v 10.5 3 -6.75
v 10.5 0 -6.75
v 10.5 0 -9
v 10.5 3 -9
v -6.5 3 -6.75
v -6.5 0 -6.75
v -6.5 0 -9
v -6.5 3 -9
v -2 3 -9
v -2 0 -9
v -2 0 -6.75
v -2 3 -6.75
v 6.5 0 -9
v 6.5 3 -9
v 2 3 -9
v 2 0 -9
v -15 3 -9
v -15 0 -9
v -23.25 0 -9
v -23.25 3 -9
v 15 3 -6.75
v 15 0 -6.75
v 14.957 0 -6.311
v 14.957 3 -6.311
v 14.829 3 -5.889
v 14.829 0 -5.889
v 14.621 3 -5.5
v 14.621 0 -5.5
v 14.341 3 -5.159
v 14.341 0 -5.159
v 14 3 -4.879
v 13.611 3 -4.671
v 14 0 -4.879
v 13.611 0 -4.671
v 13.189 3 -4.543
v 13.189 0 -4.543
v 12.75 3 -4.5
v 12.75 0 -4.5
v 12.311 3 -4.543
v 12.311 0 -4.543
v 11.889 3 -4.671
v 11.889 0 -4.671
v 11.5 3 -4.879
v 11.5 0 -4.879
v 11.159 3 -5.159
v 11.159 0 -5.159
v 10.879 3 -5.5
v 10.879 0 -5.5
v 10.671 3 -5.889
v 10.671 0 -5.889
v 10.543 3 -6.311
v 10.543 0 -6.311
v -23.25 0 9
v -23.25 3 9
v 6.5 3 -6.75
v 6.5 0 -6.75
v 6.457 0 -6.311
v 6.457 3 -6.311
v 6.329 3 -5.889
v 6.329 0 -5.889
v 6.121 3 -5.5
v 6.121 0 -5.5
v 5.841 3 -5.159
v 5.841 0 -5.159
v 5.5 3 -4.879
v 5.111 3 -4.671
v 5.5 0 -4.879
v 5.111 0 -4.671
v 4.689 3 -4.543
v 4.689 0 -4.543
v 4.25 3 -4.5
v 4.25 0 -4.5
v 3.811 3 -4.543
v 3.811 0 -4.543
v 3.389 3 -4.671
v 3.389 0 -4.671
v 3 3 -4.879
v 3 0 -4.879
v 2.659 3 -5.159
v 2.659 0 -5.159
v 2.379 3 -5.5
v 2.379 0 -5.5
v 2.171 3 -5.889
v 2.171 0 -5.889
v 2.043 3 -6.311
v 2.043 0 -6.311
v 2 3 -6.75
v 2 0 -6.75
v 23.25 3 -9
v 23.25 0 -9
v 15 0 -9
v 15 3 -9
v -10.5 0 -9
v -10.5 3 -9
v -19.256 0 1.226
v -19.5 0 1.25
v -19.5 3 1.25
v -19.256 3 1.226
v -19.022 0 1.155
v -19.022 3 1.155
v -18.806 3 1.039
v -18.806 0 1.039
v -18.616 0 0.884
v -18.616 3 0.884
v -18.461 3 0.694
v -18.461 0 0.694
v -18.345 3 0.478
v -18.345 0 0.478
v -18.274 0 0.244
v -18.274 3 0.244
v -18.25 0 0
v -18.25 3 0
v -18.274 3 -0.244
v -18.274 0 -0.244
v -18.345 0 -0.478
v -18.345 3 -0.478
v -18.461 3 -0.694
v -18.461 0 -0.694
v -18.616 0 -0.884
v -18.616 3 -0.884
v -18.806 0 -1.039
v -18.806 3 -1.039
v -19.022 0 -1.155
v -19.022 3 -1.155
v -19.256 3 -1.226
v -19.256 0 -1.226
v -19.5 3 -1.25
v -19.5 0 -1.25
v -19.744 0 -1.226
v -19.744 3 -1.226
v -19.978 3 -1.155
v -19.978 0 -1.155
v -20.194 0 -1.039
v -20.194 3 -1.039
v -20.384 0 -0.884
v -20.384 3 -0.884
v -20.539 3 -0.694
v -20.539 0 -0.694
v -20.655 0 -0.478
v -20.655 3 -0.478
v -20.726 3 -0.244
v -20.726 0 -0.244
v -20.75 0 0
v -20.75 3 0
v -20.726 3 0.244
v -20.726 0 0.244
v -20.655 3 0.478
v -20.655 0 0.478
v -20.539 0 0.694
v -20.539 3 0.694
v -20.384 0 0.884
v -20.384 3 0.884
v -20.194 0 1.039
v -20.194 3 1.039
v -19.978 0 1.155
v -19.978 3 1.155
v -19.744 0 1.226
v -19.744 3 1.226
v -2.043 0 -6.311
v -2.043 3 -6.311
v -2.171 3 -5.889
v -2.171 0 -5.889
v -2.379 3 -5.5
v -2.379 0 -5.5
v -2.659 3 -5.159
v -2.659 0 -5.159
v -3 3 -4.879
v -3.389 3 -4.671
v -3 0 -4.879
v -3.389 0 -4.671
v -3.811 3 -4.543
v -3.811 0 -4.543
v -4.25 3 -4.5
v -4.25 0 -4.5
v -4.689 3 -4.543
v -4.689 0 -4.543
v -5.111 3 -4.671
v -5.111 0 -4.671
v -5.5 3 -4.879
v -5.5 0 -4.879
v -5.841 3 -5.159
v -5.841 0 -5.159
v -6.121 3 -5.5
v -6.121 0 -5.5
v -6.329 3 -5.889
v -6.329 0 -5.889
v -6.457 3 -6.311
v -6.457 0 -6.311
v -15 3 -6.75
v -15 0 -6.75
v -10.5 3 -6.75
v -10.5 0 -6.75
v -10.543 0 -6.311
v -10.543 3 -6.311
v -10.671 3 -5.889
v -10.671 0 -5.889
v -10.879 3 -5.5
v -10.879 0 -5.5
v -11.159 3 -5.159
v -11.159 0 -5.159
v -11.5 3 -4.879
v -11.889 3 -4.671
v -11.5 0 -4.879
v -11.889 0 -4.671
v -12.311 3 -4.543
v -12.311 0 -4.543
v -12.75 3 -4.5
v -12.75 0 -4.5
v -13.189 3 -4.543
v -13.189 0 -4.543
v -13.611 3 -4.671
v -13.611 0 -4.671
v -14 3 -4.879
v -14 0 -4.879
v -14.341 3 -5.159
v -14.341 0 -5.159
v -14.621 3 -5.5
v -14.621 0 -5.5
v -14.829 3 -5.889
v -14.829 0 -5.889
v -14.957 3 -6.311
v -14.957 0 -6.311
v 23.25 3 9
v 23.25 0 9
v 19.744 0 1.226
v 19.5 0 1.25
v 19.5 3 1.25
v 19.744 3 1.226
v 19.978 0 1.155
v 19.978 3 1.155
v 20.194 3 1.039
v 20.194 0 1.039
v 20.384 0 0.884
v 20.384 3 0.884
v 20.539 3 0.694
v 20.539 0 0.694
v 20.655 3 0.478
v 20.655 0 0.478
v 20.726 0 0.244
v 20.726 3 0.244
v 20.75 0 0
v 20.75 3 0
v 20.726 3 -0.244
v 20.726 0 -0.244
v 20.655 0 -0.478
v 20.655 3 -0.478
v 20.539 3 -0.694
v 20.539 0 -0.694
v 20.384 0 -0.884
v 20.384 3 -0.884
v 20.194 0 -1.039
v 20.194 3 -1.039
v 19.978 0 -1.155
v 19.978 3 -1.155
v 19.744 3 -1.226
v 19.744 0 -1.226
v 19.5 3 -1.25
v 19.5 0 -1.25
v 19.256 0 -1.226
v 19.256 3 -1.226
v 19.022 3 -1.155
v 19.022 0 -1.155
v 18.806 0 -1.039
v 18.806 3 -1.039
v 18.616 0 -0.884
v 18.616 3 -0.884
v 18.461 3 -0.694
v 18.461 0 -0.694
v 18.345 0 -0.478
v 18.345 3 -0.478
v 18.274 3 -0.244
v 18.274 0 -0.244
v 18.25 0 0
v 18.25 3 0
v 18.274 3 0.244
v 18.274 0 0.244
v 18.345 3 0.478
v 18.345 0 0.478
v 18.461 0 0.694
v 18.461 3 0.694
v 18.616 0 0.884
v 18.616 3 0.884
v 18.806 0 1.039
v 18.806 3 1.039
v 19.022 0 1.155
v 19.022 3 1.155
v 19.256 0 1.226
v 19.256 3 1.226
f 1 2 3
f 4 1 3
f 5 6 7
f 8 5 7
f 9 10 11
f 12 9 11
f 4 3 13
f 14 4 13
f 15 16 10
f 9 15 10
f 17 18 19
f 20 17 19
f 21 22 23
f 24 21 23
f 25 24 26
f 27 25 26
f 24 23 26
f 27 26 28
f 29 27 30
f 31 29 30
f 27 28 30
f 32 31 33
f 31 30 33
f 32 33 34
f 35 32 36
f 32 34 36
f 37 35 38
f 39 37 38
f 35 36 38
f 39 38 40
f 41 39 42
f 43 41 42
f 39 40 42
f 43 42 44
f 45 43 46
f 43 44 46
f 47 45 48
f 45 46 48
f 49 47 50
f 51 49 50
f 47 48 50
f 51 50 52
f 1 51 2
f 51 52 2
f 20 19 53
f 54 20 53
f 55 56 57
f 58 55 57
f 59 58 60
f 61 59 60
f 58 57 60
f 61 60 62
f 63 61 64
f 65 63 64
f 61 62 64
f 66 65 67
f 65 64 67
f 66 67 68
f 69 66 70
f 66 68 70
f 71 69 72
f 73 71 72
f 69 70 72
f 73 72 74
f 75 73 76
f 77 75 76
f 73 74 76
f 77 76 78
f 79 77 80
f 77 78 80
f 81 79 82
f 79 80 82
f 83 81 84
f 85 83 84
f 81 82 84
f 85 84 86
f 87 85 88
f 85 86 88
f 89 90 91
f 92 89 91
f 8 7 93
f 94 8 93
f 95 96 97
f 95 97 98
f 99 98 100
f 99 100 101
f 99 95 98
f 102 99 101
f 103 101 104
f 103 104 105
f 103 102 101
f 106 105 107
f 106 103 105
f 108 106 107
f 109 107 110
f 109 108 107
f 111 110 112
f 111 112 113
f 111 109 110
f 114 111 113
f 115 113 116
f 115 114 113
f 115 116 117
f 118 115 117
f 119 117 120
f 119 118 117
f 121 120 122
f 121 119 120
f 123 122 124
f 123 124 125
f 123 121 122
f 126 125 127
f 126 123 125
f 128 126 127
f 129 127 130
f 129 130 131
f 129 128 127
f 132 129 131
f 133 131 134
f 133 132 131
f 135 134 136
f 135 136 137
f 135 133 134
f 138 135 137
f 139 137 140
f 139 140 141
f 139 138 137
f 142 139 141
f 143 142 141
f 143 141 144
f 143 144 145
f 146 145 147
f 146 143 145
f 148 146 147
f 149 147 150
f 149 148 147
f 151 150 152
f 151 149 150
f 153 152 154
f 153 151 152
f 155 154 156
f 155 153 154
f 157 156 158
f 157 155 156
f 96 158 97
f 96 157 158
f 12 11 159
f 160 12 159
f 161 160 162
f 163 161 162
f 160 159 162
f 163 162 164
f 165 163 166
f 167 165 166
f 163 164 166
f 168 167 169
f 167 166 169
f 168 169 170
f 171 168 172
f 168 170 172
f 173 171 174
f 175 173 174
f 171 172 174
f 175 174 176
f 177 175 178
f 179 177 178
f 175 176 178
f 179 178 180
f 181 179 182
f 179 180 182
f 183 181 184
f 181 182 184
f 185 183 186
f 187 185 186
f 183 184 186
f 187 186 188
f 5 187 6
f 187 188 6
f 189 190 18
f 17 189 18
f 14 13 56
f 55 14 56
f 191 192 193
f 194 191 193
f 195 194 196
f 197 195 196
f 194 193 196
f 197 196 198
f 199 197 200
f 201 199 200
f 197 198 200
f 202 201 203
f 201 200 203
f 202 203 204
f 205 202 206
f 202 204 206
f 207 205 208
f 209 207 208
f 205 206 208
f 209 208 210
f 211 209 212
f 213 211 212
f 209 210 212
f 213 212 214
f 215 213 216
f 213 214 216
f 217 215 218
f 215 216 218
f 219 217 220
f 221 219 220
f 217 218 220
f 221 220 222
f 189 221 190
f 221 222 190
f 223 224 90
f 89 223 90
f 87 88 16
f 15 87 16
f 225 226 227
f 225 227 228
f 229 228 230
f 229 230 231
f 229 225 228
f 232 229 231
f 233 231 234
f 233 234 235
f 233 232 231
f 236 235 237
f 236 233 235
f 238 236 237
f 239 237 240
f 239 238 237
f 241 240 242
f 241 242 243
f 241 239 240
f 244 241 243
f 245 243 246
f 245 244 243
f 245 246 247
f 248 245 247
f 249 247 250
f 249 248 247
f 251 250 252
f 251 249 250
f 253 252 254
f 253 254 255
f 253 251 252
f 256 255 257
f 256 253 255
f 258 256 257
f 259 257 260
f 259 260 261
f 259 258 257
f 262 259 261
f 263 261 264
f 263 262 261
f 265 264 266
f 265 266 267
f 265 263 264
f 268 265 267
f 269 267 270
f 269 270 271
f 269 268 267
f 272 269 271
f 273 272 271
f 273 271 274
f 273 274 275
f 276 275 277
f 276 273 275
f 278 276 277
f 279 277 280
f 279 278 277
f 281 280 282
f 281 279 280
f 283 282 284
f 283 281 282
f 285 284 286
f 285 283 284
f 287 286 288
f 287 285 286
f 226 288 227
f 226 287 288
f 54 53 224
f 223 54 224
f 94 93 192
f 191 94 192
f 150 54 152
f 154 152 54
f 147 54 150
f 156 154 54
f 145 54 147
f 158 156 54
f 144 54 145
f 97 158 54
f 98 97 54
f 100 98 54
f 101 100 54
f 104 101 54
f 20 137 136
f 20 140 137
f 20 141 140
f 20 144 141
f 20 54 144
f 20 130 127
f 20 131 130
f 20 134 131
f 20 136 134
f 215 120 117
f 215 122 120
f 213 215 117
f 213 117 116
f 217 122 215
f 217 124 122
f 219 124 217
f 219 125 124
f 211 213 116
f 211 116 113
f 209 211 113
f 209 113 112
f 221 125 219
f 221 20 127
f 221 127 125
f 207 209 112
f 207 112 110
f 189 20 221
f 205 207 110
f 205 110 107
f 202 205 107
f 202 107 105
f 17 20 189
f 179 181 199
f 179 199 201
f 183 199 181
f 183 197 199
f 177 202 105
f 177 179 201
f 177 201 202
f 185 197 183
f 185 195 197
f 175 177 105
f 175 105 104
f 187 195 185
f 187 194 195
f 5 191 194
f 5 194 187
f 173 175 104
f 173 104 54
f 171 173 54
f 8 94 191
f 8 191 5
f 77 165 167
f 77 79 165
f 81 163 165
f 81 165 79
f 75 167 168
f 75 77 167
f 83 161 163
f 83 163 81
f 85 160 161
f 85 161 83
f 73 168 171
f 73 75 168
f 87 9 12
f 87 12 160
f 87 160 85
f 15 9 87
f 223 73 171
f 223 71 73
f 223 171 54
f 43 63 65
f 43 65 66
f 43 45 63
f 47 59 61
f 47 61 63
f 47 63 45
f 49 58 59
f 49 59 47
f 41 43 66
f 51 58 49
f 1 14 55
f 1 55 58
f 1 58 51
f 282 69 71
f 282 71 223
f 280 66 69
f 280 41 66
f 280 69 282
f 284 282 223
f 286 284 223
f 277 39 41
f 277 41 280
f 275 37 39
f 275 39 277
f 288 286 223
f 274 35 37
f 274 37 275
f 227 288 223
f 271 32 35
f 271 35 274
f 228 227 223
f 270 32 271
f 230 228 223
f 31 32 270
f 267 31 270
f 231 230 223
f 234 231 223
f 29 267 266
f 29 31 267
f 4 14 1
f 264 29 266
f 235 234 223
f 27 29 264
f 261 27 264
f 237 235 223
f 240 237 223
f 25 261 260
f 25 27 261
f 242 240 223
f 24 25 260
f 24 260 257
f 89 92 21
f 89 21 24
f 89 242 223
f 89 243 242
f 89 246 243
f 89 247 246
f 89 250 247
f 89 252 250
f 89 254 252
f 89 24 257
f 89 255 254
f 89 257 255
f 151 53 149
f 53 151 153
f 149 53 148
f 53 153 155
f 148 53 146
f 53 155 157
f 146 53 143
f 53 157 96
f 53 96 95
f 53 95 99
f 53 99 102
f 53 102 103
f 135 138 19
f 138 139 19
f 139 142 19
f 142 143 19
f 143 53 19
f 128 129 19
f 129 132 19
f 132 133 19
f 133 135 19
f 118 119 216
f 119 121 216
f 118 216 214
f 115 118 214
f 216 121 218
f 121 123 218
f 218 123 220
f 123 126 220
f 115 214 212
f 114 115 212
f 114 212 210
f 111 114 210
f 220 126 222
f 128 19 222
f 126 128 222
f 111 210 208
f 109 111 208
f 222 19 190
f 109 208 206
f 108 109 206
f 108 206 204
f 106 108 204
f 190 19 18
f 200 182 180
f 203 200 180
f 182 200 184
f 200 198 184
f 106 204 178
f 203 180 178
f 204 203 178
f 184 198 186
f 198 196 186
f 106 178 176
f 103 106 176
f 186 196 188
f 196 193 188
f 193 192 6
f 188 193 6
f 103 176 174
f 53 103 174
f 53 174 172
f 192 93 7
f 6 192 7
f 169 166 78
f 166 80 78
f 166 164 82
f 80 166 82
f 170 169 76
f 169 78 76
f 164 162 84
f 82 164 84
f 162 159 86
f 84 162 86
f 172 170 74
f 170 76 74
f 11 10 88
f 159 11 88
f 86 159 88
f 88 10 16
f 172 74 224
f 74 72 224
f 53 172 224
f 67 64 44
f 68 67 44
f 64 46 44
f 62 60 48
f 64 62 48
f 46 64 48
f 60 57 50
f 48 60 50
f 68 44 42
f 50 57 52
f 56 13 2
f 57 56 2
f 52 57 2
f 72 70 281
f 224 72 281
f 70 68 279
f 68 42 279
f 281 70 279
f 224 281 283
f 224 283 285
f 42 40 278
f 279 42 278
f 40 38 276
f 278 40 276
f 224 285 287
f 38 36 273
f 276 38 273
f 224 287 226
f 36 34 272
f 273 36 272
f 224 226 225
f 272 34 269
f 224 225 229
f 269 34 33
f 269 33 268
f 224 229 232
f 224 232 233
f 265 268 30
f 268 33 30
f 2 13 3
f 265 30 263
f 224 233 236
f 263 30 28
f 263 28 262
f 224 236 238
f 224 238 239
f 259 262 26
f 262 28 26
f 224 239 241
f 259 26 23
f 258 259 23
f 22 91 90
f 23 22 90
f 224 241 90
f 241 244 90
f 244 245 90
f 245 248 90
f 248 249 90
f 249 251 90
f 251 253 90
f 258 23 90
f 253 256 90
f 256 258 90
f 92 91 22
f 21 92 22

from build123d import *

# Parameters (mm, degrees)
SKETCH1_R           = 1.25
BOSS_EXTRUDE1_DEPTH = 3


with BuildPart() as part:
    # Sketch1 → Boss-Extrude1 (new body)
    with BuildSketch(Plane(origin=(0, 0, 0), x_dir=(1, 0, 0), z_dir=(0, 1, 0))):
        with BuildLine():
            Line((-23.25, 9), (-23.25, -9))
            Line((-23.25, -9), (23.25, -9))
            Line((23.25, -9), (23.25, 9))
            Line((23.25, 9), (15, 9))
            Line((15, 9), (15, 6.75))
            ThreePointArc((15, 6.75), (12.75, 4.5), (10.5, 6.75))
            Line((10.5, 6.75), (10.5, 9))
            Line((10.5, 9), (6.5, 9))
            Line((6.5, 9), (6.5, 6.75))
            ThreePointArc((6.5, 6.75), (4.25, 4.5), (2, 6.75))
            Line((2, 6.75), (2, 9))
            Line((2, 9), (-2, 9))
            Line((-2, 9), (-2, 6.75))
            ThreePointArc((-2, 6.75), (-4.25, 4.5), (-6.5, 6.75))
            Line((-6.5, 6.75), (-6.5, 9))
            Line((-6.5, 9), (-10.5, 9))
            Line((-10.5, 9), (-10.5, 6.75))
            ThreePointArc((-10.5, 6.75), (-12.75, 4.5), (-15, 6.75))
            Line((-15, 6.75), (-15, 9))
            Line((-15, 9), (-23.25, 9))
        make_face()
        with Locations(Location((-19.5, 0, 0), (0, 0, 270))):
            Circle(SKETCH1_R, mode=Mode.SUBTRACT)
        with Locations(Location((19.5, 0, 0), (0, 0, 270))):
            Circle(SKETCH1_R, mode=Mode.SUBTRACT)
    extrude(amount=BOSS_EXTRUDE1_DEPTH)


solid = part.part
